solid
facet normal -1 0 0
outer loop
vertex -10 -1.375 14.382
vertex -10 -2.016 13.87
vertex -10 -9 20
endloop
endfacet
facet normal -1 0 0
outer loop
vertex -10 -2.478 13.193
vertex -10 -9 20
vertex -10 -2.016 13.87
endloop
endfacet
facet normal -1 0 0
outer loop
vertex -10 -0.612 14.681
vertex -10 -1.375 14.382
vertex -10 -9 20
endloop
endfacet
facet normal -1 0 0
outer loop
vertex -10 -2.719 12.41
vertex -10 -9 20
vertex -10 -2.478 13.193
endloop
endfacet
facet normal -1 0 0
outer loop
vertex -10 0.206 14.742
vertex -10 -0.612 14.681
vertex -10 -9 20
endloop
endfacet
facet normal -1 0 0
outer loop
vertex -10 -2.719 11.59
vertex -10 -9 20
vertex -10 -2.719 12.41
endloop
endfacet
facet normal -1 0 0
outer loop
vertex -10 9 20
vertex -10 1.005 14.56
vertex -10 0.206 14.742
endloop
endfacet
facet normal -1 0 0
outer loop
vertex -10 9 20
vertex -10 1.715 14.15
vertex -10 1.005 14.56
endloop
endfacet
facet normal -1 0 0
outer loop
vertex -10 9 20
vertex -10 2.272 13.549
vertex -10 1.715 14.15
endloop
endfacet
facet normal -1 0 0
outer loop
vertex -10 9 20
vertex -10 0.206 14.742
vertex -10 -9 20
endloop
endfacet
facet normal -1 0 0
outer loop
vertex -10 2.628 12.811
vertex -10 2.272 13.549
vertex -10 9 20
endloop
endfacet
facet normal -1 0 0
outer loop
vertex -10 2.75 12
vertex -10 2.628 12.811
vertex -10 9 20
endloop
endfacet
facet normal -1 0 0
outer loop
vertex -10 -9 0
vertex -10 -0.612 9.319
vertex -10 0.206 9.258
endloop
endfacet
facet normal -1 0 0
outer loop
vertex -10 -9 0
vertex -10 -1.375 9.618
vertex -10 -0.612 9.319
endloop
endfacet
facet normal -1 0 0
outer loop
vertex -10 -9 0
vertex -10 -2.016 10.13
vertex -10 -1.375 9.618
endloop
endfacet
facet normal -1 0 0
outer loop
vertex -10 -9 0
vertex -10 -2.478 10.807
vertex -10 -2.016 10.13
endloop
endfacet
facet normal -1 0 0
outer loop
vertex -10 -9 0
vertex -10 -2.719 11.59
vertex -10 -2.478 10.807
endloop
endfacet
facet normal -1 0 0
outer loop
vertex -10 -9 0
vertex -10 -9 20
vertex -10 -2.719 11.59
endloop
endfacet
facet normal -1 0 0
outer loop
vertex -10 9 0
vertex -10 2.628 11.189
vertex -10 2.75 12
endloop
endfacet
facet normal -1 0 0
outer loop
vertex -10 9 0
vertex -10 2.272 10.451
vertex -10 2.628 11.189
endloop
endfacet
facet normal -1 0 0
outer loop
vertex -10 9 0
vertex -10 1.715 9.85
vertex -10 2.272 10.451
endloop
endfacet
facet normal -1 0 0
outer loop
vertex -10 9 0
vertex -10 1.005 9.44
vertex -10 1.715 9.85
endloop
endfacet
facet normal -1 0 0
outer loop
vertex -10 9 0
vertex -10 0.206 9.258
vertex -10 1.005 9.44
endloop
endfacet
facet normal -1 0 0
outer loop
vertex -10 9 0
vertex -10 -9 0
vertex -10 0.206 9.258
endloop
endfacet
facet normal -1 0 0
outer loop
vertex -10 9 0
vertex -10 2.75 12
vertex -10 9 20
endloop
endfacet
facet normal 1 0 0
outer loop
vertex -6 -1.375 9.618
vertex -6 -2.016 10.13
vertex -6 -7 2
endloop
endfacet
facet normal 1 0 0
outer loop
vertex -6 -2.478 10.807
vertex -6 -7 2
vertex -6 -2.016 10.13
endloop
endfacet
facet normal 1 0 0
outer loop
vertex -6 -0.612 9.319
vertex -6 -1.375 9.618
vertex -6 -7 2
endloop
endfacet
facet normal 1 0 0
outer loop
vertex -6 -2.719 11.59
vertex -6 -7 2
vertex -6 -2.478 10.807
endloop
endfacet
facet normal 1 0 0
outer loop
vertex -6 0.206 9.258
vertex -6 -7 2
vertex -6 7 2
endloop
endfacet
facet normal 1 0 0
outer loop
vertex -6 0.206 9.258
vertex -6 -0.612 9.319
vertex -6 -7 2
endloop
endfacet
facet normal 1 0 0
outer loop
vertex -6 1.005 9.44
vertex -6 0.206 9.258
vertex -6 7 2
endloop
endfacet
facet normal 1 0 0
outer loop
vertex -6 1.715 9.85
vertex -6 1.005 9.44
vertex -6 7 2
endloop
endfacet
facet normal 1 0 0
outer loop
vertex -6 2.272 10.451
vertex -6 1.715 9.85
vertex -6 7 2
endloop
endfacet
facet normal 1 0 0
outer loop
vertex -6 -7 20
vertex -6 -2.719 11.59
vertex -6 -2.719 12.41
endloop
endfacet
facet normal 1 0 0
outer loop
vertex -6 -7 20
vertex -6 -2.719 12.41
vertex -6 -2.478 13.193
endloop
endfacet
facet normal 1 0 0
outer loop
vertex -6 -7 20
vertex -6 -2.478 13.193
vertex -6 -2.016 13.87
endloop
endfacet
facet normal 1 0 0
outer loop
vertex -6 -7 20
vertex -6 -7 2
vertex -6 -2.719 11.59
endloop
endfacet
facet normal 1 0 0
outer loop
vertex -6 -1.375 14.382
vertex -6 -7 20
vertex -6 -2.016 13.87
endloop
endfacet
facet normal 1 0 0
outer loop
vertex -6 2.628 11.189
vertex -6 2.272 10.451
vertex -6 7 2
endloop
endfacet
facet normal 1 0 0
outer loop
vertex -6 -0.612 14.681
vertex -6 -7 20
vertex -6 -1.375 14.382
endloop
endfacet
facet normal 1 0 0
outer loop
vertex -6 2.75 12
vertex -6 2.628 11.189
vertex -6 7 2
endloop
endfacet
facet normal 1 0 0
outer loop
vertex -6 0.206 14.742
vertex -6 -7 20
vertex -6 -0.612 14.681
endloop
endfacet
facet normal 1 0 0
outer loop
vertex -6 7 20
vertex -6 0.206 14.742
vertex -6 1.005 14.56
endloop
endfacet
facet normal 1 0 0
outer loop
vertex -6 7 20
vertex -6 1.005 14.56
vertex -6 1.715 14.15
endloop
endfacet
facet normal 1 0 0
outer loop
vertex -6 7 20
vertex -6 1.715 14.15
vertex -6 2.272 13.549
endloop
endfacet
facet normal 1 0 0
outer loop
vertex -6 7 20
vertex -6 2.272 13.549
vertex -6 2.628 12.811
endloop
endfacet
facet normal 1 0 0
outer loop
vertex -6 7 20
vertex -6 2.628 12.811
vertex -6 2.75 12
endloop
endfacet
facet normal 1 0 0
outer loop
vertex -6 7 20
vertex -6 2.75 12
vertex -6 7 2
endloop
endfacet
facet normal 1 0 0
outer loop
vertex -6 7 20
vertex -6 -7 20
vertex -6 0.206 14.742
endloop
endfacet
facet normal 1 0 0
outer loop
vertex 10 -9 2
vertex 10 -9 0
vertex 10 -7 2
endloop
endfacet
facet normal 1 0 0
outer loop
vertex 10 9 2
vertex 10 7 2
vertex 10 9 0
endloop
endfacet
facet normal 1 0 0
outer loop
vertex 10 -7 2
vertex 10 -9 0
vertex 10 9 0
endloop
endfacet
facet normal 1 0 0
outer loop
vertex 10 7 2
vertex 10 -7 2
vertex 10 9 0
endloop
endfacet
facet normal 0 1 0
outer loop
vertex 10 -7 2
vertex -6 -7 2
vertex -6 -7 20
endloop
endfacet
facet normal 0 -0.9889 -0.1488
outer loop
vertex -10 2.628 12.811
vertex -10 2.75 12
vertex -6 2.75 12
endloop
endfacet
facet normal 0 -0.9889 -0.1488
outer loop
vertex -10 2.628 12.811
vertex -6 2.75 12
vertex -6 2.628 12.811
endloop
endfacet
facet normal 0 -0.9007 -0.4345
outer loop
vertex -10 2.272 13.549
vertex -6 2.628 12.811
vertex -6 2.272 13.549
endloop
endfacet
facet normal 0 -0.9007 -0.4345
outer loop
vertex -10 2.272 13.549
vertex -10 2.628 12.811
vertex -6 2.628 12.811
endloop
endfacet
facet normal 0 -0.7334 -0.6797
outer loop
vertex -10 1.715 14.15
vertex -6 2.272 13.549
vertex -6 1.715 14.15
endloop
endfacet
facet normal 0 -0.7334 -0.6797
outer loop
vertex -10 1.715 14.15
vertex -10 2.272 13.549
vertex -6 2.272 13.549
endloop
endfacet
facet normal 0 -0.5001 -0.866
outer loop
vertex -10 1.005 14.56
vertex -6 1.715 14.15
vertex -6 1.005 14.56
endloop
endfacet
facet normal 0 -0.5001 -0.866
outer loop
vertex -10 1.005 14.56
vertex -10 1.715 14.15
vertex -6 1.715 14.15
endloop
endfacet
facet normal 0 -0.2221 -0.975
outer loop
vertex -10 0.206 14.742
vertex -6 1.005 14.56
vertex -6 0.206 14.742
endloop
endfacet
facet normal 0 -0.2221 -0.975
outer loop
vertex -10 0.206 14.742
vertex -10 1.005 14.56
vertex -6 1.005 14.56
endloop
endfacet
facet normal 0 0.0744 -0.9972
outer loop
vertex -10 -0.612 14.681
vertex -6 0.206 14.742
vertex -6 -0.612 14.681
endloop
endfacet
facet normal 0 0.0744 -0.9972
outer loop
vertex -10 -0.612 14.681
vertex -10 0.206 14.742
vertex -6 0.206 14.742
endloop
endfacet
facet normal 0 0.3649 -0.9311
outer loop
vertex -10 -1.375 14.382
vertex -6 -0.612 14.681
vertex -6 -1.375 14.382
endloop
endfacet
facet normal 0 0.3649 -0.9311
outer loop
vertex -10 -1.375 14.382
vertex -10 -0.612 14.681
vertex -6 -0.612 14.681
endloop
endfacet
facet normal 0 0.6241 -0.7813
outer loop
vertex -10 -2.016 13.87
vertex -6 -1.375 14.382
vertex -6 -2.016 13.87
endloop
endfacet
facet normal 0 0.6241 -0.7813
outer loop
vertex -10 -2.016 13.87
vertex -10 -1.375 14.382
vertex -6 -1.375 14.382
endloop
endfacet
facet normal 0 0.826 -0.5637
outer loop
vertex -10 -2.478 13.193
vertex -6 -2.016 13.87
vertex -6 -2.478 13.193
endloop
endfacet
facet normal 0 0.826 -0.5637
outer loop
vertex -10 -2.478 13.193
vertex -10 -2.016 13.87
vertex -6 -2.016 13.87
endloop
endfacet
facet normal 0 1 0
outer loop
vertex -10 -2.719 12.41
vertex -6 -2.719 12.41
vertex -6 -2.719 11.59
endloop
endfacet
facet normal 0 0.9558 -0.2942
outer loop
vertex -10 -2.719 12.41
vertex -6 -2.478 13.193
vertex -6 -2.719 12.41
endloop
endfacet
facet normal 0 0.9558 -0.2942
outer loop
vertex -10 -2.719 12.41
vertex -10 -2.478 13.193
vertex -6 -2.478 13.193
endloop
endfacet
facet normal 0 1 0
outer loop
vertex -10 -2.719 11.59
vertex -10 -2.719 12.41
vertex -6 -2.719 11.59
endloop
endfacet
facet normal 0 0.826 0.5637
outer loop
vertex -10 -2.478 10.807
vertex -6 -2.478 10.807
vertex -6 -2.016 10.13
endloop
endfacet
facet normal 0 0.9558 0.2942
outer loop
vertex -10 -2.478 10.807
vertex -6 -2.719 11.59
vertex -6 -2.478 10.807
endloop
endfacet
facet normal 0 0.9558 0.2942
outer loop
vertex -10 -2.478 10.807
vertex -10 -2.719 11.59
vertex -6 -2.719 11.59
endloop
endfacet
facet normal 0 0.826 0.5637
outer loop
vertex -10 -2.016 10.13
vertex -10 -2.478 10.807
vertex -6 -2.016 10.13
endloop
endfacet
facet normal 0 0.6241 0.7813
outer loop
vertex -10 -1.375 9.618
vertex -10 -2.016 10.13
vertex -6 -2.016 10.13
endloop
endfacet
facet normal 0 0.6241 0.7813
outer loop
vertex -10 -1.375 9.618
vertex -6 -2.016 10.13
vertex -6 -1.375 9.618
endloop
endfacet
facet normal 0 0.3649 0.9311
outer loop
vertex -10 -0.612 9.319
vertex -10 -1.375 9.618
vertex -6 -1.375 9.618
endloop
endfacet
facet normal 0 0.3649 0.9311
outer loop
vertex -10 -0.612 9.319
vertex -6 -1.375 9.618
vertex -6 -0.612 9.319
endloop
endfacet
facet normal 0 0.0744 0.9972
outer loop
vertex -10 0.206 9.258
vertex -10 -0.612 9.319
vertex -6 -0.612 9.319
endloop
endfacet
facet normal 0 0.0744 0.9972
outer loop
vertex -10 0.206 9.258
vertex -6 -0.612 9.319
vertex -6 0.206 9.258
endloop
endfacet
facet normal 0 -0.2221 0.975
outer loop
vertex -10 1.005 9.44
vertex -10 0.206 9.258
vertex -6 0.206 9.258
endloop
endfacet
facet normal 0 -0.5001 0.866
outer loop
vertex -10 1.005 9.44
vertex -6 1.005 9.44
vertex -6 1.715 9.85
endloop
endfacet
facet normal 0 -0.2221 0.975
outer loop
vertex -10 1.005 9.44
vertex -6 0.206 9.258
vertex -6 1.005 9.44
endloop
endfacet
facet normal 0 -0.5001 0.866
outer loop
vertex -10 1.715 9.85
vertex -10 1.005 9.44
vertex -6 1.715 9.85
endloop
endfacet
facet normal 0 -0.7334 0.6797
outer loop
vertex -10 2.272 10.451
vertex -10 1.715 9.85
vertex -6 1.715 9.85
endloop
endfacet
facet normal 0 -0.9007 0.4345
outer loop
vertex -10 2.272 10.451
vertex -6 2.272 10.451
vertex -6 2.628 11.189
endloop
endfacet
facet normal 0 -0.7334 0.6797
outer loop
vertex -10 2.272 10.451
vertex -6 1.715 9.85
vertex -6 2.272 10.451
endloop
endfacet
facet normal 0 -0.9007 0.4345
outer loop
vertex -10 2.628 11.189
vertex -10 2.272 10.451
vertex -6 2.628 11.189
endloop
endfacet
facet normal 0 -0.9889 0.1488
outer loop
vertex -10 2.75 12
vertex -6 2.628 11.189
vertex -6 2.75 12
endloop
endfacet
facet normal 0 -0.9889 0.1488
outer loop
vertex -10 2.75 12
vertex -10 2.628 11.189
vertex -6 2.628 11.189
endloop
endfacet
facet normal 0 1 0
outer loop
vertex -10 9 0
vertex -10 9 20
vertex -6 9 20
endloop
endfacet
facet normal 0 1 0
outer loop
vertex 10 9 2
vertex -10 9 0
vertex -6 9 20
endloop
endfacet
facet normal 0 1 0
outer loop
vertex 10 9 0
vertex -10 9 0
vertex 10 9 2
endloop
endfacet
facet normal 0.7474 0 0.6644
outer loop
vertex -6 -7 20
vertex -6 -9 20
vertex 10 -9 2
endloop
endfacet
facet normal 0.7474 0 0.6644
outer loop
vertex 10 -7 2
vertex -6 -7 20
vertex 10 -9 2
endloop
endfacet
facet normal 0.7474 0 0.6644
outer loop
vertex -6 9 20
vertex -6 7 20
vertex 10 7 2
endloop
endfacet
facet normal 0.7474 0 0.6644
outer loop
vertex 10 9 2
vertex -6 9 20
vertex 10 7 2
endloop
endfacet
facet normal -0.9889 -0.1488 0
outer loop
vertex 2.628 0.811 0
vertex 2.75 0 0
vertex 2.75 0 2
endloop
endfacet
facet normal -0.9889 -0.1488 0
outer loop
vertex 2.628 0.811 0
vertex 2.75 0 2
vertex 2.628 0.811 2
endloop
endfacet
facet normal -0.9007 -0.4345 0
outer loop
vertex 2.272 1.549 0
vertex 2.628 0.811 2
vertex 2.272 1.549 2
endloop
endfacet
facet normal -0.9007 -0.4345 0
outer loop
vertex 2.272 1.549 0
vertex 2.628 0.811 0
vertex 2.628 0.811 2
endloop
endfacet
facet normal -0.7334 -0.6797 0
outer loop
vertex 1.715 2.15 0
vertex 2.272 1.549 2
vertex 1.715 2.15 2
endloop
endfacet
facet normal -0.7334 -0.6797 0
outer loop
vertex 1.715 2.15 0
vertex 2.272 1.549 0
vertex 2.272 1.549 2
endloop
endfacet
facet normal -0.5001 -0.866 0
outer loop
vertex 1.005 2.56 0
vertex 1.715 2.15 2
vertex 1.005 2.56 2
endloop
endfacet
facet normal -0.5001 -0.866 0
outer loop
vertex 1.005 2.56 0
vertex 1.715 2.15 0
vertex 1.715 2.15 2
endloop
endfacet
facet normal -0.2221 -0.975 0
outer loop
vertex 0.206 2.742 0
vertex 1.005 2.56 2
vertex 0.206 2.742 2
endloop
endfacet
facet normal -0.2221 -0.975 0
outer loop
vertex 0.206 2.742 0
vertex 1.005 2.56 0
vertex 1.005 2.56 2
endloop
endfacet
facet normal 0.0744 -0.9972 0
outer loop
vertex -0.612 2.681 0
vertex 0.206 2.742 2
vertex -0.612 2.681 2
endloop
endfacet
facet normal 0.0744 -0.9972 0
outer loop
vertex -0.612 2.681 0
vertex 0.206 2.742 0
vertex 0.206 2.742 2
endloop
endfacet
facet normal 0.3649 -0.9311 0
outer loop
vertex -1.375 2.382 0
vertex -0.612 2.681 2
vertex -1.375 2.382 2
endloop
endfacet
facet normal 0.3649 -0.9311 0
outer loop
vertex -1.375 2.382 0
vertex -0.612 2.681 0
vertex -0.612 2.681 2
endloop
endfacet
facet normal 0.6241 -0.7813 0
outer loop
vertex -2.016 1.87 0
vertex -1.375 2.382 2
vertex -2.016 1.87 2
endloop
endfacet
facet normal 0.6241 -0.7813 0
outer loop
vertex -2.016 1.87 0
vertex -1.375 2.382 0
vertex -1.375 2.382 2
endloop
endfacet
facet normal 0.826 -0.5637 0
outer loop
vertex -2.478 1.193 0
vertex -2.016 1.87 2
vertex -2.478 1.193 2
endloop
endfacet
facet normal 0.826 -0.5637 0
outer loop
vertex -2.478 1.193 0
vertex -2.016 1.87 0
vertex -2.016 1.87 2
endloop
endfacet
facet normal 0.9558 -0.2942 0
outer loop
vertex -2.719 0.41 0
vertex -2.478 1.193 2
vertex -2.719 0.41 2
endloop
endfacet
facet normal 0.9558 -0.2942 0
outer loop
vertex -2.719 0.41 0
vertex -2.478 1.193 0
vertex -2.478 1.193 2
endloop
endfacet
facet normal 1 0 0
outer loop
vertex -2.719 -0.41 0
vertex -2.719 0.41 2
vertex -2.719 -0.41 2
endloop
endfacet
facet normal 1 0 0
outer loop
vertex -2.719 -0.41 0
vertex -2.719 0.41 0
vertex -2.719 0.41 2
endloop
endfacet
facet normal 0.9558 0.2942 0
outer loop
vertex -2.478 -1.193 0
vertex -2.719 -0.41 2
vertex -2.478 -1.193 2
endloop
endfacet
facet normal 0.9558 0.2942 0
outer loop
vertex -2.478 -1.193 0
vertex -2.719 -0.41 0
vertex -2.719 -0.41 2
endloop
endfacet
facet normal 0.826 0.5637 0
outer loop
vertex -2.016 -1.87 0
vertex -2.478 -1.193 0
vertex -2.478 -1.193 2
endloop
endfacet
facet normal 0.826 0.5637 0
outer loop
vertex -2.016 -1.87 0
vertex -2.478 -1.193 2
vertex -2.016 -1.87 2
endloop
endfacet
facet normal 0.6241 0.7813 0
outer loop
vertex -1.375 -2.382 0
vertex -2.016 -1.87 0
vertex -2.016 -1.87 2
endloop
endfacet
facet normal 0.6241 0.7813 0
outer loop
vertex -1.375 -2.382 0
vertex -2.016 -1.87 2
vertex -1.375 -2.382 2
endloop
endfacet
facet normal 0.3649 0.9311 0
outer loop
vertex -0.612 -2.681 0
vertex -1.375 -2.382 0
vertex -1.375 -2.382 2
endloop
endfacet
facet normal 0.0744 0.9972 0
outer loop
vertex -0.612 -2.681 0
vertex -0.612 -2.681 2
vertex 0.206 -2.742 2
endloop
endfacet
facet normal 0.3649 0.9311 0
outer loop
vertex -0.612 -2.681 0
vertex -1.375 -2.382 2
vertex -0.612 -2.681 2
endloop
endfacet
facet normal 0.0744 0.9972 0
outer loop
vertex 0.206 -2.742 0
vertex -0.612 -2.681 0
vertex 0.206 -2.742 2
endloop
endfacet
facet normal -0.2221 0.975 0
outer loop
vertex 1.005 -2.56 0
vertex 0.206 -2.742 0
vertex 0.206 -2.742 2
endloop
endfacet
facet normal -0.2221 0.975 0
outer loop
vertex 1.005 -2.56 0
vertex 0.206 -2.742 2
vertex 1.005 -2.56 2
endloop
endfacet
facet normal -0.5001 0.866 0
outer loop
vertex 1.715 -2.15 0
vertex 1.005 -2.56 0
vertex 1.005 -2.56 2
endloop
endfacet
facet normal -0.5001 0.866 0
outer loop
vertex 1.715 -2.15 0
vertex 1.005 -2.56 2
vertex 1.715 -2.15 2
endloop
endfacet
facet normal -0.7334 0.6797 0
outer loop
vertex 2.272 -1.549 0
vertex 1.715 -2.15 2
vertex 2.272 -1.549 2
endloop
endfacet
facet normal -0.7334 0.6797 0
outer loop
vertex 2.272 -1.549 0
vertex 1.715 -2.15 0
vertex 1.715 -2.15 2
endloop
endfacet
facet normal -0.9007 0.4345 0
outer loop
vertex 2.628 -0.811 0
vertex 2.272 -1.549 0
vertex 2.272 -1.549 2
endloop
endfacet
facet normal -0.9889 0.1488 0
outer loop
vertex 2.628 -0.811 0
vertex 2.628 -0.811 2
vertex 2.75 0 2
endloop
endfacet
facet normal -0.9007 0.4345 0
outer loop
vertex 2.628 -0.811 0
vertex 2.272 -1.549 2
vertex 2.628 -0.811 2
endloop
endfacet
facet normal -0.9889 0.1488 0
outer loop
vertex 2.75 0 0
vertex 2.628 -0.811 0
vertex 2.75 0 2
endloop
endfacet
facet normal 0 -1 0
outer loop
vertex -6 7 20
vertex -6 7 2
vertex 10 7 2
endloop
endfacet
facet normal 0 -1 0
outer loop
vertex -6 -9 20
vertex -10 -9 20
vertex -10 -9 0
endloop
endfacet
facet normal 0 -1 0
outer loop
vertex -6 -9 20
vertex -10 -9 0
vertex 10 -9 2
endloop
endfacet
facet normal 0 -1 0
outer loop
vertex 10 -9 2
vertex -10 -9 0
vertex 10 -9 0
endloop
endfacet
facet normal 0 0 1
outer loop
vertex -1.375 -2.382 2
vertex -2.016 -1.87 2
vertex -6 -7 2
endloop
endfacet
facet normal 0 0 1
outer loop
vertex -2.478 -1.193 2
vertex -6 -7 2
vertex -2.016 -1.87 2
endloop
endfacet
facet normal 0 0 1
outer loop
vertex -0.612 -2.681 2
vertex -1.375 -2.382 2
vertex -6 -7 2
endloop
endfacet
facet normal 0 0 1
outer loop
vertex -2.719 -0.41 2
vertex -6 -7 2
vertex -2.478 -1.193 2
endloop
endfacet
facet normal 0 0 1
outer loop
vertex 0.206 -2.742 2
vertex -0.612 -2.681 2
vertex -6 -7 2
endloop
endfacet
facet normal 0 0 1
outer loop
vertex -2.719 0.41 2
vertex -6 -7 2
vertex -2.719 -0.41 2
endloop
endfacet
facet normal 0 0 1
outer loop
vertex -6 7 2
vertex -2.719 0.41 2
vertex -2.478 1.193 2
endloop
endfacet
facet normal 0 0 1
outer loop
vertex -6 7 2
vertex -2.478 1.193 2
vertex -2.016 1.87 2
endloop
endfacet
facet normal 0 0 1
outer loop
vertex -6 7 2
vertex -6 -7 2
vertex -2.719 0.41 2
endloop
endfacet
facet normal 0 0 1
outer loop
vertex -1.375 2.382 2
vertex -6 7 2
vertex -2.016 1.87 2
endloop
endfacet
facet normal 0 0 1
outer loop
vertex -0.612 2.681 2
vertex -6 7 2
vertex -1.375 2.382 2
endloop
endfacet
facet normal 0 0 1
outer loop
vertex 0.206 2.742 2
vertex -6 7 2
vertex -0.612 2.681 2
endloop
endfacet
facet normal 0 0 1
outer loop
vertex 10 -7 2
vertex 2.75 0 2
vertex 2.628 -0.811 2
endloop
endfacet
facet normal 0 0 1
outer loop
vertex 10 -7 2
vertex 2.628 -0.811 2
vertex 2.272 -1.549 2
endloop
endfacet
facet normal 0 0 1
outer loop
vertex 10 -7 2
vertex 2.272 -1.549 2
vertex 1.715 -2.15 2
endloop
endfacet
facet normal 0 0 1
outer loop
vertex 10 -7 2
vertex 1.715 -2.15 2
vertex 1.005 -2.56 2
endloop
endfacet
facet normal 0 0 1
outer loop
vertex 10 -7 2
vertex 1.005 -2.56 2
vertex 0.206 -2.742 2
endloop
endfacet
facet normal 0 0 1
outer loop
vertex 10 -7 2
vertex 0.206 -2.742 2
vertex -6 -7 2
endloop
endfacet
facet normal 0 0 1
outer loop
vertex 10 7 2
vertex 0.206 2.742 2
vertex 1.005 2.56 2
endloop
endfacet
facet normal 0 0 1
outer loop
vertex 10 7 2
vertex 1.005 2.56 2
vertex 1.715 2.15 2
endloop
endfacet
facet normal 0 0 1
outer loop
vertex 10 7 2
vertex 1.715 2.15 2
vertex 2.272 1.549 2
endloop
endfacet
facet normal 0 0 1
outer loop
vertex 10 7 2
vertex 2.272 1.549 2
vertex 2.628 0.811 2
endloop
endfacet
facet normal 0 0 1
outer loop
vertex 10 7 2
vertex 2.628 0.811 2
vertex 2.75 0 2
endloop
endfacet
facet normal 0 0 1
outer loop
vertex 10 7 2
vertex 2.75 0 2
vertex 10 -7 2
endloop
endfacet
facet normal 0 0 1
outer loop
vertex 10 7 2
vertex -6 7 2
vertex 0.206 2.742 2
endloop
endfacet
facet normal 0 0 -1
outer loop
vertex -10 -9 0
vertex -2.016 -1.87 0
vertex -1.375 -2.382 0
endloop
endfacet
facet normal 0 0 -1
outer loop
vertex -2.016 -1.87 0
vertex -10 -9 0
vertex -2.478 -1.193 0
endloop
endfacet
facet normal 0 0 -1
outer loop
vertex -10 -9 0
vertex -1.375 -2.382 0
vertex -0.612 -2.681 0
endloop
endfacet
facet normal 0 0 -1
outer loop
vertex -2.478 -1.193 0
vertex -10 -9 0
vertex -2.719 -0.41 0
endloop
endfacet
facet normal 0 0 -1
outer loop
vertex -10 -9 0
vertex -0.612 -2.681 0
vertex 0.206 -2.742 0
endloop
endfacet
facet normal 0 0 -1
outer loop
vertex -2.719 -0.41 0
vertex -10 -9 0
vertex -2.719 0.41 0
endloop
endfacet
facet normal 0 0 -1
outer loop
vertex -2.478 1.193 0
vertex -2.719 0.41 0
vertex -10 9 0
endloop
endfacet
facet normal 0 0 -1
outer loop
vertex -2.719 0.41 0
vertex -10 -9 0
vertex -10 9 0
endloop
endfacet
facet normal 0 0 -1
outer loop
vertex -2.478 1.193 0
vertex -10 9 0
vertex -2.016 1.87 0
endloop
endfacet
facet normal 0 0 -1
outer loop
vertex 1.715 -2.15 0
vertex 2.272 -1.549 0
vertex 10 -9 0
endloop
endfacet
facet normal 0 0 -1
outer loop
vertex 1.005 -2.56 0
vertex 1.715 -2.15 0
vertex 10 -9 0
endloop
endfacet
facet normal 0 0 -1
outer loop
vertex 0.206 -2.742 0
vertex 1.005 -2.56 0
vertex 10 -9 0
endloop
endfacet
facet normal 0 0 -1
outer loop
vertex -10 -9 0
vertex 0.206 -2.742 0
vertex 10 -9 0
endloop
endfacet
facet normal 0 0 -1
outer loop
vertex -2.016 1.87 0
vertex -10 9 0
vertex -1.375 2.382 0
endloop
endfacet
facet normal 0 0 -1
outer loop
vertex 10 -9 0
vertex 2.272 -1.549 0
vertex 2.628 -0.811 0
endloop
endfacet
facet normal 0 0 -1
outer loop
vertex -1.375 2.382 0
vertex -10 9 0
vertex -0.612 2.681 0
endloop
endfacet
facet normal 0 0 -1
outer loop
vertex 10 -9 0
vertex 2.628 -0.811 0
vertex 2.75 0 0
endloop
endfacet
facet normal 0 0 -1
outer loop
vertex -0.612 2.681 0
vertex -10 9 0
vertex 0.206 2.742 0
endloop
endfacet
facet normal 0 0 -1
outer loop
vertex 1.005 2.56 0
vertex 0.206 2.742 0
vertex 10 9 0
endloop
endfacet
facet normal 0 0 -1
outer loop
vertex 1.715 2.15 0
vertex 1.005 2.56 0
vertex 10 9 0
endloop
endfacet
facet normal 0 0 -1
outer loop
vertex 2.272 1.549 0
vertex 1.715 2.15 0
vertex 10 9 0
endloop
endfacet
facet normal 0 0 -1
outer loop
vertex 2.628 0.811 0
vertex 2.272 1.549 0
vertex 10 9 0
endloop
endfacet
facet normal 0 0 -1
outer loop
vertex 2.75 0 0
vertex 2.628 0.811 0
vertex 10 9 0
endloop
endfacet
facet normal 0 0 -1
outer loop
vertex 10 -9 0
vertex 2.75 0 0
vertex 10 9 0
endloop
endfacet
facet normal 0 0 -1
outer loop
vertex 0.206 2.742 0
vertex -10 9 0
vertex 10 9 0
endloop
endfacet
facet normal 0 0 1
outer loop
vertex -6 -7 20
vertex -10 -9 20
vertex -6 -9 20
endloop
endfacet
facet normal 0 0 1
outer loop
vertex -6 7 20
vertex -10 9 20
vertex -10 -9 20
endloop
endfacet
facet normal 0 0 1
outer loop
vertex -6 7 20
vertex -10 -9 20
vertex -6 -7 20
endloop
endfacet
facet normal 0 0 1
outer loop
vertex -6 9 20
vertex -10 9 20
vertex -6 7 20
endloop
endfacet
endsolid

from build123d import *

# Parameters (mm, degrees)
SKETCH_1_W               = 20
SKETCH_1_H               = 18
EXTRUDE_1_DEPTH          = 20
SKETCH_2_W               = 16
SKETCH_2_H               = 14
CUT_EXTRUDE_1_DEPTH      = 18
CUT_EXTRUDE_2_DEPTH      = 28.49545417
CUT_EXTRUDE_2_DEPTH_BACK = 28.49545417
CUT_EXTRUDE_3_DEPTH      = 23.472205054
CUT_EXTRUDE_3_DEPTH_BACK = 23.472205054
SKETCH_5_R               = 2.75
CUT_EXTRUDE_4_DEPTH      = 28.147743921
CUT_EXTRUDE_4_DEPTH_BACK = 28.147743921
SKETCH_6_R               = 2.75


with BuildPart() as part:
    # 스케치1 → 보스-돌출1 (new body)
    with BuildSketch(Plane.XY):
        Rectangle(SKETCH_1_W, SKETCH_1_H)
    extrude(amount=EXTRUDE_1_DEPTH)

    # 스케치2 → 컷-돌출1 (cut)
    with BuildSketch(Plane.XY.offset(20)):
        with Locations((2, 0)):
            Rectangle(SKETCH_2_W, SKETCH_2_H)
    extrude(amount=-CUT_EXTRUDE_1_DEPTH, mode=Mode.SUBTRACT)

    # 스케치4 → 컷-돌출2 (cut, two sides: drawn at the far end of the back side and taken through both)
    with BuildSketch(Plane(origin=(0, -7, 0), x_dir=(1, 0, 0), z_dir=(0, 1, 0)).offset(-CUT_EXTRUDE_2_DEPTH_BACK)):
        Polygon((-6, -20), (10, -2), (10, -20), align=None)
    extrude(amount=CUT_EXTRUDE_2_DEPTH + CUT_EXTRUDE_2_DEPTH_BACK, mode=Mode.SUBTRACT)

    # 스케치5 → 컷-돌출3 (cut, two sides: drawn at the far end of the back side and taken through both)
    with BuildSketch(Plane.XY.offset(2).offset(-CUT_EXTRUDE_3_DEPTH_BACK)):
        Circle(SKETCH_5_R)
    extrude(amount=CUT_EXTRUDE_3_DEPTH + CUT_EXTRUDE_3_DEPTH_BACK, mode=Mode.SUBTRACT)

    # 스케치6 → 컷-돌출4 (cut, two sides: drawn at the far end of the back side and taken through both)
    with BuildSketch(Plane(origin=(-6, 0, 0), x_dir=(0, 0, -1), z_dir=(1, 0, 0)).offset(-CUT_EXTRUDE_4_DEPTH_BACK)):
        with Locations(Location((-12, 0, 0), (0, 0, 90))):
            Circle(SKETCH_6_R)
    extrude(amount=CUT_EXTRUDE_4_DEPTH + CUT_EXTRUDE_4_DEPTH_BACK, mode=Mode.SUBTRACT)


solid = part.part
